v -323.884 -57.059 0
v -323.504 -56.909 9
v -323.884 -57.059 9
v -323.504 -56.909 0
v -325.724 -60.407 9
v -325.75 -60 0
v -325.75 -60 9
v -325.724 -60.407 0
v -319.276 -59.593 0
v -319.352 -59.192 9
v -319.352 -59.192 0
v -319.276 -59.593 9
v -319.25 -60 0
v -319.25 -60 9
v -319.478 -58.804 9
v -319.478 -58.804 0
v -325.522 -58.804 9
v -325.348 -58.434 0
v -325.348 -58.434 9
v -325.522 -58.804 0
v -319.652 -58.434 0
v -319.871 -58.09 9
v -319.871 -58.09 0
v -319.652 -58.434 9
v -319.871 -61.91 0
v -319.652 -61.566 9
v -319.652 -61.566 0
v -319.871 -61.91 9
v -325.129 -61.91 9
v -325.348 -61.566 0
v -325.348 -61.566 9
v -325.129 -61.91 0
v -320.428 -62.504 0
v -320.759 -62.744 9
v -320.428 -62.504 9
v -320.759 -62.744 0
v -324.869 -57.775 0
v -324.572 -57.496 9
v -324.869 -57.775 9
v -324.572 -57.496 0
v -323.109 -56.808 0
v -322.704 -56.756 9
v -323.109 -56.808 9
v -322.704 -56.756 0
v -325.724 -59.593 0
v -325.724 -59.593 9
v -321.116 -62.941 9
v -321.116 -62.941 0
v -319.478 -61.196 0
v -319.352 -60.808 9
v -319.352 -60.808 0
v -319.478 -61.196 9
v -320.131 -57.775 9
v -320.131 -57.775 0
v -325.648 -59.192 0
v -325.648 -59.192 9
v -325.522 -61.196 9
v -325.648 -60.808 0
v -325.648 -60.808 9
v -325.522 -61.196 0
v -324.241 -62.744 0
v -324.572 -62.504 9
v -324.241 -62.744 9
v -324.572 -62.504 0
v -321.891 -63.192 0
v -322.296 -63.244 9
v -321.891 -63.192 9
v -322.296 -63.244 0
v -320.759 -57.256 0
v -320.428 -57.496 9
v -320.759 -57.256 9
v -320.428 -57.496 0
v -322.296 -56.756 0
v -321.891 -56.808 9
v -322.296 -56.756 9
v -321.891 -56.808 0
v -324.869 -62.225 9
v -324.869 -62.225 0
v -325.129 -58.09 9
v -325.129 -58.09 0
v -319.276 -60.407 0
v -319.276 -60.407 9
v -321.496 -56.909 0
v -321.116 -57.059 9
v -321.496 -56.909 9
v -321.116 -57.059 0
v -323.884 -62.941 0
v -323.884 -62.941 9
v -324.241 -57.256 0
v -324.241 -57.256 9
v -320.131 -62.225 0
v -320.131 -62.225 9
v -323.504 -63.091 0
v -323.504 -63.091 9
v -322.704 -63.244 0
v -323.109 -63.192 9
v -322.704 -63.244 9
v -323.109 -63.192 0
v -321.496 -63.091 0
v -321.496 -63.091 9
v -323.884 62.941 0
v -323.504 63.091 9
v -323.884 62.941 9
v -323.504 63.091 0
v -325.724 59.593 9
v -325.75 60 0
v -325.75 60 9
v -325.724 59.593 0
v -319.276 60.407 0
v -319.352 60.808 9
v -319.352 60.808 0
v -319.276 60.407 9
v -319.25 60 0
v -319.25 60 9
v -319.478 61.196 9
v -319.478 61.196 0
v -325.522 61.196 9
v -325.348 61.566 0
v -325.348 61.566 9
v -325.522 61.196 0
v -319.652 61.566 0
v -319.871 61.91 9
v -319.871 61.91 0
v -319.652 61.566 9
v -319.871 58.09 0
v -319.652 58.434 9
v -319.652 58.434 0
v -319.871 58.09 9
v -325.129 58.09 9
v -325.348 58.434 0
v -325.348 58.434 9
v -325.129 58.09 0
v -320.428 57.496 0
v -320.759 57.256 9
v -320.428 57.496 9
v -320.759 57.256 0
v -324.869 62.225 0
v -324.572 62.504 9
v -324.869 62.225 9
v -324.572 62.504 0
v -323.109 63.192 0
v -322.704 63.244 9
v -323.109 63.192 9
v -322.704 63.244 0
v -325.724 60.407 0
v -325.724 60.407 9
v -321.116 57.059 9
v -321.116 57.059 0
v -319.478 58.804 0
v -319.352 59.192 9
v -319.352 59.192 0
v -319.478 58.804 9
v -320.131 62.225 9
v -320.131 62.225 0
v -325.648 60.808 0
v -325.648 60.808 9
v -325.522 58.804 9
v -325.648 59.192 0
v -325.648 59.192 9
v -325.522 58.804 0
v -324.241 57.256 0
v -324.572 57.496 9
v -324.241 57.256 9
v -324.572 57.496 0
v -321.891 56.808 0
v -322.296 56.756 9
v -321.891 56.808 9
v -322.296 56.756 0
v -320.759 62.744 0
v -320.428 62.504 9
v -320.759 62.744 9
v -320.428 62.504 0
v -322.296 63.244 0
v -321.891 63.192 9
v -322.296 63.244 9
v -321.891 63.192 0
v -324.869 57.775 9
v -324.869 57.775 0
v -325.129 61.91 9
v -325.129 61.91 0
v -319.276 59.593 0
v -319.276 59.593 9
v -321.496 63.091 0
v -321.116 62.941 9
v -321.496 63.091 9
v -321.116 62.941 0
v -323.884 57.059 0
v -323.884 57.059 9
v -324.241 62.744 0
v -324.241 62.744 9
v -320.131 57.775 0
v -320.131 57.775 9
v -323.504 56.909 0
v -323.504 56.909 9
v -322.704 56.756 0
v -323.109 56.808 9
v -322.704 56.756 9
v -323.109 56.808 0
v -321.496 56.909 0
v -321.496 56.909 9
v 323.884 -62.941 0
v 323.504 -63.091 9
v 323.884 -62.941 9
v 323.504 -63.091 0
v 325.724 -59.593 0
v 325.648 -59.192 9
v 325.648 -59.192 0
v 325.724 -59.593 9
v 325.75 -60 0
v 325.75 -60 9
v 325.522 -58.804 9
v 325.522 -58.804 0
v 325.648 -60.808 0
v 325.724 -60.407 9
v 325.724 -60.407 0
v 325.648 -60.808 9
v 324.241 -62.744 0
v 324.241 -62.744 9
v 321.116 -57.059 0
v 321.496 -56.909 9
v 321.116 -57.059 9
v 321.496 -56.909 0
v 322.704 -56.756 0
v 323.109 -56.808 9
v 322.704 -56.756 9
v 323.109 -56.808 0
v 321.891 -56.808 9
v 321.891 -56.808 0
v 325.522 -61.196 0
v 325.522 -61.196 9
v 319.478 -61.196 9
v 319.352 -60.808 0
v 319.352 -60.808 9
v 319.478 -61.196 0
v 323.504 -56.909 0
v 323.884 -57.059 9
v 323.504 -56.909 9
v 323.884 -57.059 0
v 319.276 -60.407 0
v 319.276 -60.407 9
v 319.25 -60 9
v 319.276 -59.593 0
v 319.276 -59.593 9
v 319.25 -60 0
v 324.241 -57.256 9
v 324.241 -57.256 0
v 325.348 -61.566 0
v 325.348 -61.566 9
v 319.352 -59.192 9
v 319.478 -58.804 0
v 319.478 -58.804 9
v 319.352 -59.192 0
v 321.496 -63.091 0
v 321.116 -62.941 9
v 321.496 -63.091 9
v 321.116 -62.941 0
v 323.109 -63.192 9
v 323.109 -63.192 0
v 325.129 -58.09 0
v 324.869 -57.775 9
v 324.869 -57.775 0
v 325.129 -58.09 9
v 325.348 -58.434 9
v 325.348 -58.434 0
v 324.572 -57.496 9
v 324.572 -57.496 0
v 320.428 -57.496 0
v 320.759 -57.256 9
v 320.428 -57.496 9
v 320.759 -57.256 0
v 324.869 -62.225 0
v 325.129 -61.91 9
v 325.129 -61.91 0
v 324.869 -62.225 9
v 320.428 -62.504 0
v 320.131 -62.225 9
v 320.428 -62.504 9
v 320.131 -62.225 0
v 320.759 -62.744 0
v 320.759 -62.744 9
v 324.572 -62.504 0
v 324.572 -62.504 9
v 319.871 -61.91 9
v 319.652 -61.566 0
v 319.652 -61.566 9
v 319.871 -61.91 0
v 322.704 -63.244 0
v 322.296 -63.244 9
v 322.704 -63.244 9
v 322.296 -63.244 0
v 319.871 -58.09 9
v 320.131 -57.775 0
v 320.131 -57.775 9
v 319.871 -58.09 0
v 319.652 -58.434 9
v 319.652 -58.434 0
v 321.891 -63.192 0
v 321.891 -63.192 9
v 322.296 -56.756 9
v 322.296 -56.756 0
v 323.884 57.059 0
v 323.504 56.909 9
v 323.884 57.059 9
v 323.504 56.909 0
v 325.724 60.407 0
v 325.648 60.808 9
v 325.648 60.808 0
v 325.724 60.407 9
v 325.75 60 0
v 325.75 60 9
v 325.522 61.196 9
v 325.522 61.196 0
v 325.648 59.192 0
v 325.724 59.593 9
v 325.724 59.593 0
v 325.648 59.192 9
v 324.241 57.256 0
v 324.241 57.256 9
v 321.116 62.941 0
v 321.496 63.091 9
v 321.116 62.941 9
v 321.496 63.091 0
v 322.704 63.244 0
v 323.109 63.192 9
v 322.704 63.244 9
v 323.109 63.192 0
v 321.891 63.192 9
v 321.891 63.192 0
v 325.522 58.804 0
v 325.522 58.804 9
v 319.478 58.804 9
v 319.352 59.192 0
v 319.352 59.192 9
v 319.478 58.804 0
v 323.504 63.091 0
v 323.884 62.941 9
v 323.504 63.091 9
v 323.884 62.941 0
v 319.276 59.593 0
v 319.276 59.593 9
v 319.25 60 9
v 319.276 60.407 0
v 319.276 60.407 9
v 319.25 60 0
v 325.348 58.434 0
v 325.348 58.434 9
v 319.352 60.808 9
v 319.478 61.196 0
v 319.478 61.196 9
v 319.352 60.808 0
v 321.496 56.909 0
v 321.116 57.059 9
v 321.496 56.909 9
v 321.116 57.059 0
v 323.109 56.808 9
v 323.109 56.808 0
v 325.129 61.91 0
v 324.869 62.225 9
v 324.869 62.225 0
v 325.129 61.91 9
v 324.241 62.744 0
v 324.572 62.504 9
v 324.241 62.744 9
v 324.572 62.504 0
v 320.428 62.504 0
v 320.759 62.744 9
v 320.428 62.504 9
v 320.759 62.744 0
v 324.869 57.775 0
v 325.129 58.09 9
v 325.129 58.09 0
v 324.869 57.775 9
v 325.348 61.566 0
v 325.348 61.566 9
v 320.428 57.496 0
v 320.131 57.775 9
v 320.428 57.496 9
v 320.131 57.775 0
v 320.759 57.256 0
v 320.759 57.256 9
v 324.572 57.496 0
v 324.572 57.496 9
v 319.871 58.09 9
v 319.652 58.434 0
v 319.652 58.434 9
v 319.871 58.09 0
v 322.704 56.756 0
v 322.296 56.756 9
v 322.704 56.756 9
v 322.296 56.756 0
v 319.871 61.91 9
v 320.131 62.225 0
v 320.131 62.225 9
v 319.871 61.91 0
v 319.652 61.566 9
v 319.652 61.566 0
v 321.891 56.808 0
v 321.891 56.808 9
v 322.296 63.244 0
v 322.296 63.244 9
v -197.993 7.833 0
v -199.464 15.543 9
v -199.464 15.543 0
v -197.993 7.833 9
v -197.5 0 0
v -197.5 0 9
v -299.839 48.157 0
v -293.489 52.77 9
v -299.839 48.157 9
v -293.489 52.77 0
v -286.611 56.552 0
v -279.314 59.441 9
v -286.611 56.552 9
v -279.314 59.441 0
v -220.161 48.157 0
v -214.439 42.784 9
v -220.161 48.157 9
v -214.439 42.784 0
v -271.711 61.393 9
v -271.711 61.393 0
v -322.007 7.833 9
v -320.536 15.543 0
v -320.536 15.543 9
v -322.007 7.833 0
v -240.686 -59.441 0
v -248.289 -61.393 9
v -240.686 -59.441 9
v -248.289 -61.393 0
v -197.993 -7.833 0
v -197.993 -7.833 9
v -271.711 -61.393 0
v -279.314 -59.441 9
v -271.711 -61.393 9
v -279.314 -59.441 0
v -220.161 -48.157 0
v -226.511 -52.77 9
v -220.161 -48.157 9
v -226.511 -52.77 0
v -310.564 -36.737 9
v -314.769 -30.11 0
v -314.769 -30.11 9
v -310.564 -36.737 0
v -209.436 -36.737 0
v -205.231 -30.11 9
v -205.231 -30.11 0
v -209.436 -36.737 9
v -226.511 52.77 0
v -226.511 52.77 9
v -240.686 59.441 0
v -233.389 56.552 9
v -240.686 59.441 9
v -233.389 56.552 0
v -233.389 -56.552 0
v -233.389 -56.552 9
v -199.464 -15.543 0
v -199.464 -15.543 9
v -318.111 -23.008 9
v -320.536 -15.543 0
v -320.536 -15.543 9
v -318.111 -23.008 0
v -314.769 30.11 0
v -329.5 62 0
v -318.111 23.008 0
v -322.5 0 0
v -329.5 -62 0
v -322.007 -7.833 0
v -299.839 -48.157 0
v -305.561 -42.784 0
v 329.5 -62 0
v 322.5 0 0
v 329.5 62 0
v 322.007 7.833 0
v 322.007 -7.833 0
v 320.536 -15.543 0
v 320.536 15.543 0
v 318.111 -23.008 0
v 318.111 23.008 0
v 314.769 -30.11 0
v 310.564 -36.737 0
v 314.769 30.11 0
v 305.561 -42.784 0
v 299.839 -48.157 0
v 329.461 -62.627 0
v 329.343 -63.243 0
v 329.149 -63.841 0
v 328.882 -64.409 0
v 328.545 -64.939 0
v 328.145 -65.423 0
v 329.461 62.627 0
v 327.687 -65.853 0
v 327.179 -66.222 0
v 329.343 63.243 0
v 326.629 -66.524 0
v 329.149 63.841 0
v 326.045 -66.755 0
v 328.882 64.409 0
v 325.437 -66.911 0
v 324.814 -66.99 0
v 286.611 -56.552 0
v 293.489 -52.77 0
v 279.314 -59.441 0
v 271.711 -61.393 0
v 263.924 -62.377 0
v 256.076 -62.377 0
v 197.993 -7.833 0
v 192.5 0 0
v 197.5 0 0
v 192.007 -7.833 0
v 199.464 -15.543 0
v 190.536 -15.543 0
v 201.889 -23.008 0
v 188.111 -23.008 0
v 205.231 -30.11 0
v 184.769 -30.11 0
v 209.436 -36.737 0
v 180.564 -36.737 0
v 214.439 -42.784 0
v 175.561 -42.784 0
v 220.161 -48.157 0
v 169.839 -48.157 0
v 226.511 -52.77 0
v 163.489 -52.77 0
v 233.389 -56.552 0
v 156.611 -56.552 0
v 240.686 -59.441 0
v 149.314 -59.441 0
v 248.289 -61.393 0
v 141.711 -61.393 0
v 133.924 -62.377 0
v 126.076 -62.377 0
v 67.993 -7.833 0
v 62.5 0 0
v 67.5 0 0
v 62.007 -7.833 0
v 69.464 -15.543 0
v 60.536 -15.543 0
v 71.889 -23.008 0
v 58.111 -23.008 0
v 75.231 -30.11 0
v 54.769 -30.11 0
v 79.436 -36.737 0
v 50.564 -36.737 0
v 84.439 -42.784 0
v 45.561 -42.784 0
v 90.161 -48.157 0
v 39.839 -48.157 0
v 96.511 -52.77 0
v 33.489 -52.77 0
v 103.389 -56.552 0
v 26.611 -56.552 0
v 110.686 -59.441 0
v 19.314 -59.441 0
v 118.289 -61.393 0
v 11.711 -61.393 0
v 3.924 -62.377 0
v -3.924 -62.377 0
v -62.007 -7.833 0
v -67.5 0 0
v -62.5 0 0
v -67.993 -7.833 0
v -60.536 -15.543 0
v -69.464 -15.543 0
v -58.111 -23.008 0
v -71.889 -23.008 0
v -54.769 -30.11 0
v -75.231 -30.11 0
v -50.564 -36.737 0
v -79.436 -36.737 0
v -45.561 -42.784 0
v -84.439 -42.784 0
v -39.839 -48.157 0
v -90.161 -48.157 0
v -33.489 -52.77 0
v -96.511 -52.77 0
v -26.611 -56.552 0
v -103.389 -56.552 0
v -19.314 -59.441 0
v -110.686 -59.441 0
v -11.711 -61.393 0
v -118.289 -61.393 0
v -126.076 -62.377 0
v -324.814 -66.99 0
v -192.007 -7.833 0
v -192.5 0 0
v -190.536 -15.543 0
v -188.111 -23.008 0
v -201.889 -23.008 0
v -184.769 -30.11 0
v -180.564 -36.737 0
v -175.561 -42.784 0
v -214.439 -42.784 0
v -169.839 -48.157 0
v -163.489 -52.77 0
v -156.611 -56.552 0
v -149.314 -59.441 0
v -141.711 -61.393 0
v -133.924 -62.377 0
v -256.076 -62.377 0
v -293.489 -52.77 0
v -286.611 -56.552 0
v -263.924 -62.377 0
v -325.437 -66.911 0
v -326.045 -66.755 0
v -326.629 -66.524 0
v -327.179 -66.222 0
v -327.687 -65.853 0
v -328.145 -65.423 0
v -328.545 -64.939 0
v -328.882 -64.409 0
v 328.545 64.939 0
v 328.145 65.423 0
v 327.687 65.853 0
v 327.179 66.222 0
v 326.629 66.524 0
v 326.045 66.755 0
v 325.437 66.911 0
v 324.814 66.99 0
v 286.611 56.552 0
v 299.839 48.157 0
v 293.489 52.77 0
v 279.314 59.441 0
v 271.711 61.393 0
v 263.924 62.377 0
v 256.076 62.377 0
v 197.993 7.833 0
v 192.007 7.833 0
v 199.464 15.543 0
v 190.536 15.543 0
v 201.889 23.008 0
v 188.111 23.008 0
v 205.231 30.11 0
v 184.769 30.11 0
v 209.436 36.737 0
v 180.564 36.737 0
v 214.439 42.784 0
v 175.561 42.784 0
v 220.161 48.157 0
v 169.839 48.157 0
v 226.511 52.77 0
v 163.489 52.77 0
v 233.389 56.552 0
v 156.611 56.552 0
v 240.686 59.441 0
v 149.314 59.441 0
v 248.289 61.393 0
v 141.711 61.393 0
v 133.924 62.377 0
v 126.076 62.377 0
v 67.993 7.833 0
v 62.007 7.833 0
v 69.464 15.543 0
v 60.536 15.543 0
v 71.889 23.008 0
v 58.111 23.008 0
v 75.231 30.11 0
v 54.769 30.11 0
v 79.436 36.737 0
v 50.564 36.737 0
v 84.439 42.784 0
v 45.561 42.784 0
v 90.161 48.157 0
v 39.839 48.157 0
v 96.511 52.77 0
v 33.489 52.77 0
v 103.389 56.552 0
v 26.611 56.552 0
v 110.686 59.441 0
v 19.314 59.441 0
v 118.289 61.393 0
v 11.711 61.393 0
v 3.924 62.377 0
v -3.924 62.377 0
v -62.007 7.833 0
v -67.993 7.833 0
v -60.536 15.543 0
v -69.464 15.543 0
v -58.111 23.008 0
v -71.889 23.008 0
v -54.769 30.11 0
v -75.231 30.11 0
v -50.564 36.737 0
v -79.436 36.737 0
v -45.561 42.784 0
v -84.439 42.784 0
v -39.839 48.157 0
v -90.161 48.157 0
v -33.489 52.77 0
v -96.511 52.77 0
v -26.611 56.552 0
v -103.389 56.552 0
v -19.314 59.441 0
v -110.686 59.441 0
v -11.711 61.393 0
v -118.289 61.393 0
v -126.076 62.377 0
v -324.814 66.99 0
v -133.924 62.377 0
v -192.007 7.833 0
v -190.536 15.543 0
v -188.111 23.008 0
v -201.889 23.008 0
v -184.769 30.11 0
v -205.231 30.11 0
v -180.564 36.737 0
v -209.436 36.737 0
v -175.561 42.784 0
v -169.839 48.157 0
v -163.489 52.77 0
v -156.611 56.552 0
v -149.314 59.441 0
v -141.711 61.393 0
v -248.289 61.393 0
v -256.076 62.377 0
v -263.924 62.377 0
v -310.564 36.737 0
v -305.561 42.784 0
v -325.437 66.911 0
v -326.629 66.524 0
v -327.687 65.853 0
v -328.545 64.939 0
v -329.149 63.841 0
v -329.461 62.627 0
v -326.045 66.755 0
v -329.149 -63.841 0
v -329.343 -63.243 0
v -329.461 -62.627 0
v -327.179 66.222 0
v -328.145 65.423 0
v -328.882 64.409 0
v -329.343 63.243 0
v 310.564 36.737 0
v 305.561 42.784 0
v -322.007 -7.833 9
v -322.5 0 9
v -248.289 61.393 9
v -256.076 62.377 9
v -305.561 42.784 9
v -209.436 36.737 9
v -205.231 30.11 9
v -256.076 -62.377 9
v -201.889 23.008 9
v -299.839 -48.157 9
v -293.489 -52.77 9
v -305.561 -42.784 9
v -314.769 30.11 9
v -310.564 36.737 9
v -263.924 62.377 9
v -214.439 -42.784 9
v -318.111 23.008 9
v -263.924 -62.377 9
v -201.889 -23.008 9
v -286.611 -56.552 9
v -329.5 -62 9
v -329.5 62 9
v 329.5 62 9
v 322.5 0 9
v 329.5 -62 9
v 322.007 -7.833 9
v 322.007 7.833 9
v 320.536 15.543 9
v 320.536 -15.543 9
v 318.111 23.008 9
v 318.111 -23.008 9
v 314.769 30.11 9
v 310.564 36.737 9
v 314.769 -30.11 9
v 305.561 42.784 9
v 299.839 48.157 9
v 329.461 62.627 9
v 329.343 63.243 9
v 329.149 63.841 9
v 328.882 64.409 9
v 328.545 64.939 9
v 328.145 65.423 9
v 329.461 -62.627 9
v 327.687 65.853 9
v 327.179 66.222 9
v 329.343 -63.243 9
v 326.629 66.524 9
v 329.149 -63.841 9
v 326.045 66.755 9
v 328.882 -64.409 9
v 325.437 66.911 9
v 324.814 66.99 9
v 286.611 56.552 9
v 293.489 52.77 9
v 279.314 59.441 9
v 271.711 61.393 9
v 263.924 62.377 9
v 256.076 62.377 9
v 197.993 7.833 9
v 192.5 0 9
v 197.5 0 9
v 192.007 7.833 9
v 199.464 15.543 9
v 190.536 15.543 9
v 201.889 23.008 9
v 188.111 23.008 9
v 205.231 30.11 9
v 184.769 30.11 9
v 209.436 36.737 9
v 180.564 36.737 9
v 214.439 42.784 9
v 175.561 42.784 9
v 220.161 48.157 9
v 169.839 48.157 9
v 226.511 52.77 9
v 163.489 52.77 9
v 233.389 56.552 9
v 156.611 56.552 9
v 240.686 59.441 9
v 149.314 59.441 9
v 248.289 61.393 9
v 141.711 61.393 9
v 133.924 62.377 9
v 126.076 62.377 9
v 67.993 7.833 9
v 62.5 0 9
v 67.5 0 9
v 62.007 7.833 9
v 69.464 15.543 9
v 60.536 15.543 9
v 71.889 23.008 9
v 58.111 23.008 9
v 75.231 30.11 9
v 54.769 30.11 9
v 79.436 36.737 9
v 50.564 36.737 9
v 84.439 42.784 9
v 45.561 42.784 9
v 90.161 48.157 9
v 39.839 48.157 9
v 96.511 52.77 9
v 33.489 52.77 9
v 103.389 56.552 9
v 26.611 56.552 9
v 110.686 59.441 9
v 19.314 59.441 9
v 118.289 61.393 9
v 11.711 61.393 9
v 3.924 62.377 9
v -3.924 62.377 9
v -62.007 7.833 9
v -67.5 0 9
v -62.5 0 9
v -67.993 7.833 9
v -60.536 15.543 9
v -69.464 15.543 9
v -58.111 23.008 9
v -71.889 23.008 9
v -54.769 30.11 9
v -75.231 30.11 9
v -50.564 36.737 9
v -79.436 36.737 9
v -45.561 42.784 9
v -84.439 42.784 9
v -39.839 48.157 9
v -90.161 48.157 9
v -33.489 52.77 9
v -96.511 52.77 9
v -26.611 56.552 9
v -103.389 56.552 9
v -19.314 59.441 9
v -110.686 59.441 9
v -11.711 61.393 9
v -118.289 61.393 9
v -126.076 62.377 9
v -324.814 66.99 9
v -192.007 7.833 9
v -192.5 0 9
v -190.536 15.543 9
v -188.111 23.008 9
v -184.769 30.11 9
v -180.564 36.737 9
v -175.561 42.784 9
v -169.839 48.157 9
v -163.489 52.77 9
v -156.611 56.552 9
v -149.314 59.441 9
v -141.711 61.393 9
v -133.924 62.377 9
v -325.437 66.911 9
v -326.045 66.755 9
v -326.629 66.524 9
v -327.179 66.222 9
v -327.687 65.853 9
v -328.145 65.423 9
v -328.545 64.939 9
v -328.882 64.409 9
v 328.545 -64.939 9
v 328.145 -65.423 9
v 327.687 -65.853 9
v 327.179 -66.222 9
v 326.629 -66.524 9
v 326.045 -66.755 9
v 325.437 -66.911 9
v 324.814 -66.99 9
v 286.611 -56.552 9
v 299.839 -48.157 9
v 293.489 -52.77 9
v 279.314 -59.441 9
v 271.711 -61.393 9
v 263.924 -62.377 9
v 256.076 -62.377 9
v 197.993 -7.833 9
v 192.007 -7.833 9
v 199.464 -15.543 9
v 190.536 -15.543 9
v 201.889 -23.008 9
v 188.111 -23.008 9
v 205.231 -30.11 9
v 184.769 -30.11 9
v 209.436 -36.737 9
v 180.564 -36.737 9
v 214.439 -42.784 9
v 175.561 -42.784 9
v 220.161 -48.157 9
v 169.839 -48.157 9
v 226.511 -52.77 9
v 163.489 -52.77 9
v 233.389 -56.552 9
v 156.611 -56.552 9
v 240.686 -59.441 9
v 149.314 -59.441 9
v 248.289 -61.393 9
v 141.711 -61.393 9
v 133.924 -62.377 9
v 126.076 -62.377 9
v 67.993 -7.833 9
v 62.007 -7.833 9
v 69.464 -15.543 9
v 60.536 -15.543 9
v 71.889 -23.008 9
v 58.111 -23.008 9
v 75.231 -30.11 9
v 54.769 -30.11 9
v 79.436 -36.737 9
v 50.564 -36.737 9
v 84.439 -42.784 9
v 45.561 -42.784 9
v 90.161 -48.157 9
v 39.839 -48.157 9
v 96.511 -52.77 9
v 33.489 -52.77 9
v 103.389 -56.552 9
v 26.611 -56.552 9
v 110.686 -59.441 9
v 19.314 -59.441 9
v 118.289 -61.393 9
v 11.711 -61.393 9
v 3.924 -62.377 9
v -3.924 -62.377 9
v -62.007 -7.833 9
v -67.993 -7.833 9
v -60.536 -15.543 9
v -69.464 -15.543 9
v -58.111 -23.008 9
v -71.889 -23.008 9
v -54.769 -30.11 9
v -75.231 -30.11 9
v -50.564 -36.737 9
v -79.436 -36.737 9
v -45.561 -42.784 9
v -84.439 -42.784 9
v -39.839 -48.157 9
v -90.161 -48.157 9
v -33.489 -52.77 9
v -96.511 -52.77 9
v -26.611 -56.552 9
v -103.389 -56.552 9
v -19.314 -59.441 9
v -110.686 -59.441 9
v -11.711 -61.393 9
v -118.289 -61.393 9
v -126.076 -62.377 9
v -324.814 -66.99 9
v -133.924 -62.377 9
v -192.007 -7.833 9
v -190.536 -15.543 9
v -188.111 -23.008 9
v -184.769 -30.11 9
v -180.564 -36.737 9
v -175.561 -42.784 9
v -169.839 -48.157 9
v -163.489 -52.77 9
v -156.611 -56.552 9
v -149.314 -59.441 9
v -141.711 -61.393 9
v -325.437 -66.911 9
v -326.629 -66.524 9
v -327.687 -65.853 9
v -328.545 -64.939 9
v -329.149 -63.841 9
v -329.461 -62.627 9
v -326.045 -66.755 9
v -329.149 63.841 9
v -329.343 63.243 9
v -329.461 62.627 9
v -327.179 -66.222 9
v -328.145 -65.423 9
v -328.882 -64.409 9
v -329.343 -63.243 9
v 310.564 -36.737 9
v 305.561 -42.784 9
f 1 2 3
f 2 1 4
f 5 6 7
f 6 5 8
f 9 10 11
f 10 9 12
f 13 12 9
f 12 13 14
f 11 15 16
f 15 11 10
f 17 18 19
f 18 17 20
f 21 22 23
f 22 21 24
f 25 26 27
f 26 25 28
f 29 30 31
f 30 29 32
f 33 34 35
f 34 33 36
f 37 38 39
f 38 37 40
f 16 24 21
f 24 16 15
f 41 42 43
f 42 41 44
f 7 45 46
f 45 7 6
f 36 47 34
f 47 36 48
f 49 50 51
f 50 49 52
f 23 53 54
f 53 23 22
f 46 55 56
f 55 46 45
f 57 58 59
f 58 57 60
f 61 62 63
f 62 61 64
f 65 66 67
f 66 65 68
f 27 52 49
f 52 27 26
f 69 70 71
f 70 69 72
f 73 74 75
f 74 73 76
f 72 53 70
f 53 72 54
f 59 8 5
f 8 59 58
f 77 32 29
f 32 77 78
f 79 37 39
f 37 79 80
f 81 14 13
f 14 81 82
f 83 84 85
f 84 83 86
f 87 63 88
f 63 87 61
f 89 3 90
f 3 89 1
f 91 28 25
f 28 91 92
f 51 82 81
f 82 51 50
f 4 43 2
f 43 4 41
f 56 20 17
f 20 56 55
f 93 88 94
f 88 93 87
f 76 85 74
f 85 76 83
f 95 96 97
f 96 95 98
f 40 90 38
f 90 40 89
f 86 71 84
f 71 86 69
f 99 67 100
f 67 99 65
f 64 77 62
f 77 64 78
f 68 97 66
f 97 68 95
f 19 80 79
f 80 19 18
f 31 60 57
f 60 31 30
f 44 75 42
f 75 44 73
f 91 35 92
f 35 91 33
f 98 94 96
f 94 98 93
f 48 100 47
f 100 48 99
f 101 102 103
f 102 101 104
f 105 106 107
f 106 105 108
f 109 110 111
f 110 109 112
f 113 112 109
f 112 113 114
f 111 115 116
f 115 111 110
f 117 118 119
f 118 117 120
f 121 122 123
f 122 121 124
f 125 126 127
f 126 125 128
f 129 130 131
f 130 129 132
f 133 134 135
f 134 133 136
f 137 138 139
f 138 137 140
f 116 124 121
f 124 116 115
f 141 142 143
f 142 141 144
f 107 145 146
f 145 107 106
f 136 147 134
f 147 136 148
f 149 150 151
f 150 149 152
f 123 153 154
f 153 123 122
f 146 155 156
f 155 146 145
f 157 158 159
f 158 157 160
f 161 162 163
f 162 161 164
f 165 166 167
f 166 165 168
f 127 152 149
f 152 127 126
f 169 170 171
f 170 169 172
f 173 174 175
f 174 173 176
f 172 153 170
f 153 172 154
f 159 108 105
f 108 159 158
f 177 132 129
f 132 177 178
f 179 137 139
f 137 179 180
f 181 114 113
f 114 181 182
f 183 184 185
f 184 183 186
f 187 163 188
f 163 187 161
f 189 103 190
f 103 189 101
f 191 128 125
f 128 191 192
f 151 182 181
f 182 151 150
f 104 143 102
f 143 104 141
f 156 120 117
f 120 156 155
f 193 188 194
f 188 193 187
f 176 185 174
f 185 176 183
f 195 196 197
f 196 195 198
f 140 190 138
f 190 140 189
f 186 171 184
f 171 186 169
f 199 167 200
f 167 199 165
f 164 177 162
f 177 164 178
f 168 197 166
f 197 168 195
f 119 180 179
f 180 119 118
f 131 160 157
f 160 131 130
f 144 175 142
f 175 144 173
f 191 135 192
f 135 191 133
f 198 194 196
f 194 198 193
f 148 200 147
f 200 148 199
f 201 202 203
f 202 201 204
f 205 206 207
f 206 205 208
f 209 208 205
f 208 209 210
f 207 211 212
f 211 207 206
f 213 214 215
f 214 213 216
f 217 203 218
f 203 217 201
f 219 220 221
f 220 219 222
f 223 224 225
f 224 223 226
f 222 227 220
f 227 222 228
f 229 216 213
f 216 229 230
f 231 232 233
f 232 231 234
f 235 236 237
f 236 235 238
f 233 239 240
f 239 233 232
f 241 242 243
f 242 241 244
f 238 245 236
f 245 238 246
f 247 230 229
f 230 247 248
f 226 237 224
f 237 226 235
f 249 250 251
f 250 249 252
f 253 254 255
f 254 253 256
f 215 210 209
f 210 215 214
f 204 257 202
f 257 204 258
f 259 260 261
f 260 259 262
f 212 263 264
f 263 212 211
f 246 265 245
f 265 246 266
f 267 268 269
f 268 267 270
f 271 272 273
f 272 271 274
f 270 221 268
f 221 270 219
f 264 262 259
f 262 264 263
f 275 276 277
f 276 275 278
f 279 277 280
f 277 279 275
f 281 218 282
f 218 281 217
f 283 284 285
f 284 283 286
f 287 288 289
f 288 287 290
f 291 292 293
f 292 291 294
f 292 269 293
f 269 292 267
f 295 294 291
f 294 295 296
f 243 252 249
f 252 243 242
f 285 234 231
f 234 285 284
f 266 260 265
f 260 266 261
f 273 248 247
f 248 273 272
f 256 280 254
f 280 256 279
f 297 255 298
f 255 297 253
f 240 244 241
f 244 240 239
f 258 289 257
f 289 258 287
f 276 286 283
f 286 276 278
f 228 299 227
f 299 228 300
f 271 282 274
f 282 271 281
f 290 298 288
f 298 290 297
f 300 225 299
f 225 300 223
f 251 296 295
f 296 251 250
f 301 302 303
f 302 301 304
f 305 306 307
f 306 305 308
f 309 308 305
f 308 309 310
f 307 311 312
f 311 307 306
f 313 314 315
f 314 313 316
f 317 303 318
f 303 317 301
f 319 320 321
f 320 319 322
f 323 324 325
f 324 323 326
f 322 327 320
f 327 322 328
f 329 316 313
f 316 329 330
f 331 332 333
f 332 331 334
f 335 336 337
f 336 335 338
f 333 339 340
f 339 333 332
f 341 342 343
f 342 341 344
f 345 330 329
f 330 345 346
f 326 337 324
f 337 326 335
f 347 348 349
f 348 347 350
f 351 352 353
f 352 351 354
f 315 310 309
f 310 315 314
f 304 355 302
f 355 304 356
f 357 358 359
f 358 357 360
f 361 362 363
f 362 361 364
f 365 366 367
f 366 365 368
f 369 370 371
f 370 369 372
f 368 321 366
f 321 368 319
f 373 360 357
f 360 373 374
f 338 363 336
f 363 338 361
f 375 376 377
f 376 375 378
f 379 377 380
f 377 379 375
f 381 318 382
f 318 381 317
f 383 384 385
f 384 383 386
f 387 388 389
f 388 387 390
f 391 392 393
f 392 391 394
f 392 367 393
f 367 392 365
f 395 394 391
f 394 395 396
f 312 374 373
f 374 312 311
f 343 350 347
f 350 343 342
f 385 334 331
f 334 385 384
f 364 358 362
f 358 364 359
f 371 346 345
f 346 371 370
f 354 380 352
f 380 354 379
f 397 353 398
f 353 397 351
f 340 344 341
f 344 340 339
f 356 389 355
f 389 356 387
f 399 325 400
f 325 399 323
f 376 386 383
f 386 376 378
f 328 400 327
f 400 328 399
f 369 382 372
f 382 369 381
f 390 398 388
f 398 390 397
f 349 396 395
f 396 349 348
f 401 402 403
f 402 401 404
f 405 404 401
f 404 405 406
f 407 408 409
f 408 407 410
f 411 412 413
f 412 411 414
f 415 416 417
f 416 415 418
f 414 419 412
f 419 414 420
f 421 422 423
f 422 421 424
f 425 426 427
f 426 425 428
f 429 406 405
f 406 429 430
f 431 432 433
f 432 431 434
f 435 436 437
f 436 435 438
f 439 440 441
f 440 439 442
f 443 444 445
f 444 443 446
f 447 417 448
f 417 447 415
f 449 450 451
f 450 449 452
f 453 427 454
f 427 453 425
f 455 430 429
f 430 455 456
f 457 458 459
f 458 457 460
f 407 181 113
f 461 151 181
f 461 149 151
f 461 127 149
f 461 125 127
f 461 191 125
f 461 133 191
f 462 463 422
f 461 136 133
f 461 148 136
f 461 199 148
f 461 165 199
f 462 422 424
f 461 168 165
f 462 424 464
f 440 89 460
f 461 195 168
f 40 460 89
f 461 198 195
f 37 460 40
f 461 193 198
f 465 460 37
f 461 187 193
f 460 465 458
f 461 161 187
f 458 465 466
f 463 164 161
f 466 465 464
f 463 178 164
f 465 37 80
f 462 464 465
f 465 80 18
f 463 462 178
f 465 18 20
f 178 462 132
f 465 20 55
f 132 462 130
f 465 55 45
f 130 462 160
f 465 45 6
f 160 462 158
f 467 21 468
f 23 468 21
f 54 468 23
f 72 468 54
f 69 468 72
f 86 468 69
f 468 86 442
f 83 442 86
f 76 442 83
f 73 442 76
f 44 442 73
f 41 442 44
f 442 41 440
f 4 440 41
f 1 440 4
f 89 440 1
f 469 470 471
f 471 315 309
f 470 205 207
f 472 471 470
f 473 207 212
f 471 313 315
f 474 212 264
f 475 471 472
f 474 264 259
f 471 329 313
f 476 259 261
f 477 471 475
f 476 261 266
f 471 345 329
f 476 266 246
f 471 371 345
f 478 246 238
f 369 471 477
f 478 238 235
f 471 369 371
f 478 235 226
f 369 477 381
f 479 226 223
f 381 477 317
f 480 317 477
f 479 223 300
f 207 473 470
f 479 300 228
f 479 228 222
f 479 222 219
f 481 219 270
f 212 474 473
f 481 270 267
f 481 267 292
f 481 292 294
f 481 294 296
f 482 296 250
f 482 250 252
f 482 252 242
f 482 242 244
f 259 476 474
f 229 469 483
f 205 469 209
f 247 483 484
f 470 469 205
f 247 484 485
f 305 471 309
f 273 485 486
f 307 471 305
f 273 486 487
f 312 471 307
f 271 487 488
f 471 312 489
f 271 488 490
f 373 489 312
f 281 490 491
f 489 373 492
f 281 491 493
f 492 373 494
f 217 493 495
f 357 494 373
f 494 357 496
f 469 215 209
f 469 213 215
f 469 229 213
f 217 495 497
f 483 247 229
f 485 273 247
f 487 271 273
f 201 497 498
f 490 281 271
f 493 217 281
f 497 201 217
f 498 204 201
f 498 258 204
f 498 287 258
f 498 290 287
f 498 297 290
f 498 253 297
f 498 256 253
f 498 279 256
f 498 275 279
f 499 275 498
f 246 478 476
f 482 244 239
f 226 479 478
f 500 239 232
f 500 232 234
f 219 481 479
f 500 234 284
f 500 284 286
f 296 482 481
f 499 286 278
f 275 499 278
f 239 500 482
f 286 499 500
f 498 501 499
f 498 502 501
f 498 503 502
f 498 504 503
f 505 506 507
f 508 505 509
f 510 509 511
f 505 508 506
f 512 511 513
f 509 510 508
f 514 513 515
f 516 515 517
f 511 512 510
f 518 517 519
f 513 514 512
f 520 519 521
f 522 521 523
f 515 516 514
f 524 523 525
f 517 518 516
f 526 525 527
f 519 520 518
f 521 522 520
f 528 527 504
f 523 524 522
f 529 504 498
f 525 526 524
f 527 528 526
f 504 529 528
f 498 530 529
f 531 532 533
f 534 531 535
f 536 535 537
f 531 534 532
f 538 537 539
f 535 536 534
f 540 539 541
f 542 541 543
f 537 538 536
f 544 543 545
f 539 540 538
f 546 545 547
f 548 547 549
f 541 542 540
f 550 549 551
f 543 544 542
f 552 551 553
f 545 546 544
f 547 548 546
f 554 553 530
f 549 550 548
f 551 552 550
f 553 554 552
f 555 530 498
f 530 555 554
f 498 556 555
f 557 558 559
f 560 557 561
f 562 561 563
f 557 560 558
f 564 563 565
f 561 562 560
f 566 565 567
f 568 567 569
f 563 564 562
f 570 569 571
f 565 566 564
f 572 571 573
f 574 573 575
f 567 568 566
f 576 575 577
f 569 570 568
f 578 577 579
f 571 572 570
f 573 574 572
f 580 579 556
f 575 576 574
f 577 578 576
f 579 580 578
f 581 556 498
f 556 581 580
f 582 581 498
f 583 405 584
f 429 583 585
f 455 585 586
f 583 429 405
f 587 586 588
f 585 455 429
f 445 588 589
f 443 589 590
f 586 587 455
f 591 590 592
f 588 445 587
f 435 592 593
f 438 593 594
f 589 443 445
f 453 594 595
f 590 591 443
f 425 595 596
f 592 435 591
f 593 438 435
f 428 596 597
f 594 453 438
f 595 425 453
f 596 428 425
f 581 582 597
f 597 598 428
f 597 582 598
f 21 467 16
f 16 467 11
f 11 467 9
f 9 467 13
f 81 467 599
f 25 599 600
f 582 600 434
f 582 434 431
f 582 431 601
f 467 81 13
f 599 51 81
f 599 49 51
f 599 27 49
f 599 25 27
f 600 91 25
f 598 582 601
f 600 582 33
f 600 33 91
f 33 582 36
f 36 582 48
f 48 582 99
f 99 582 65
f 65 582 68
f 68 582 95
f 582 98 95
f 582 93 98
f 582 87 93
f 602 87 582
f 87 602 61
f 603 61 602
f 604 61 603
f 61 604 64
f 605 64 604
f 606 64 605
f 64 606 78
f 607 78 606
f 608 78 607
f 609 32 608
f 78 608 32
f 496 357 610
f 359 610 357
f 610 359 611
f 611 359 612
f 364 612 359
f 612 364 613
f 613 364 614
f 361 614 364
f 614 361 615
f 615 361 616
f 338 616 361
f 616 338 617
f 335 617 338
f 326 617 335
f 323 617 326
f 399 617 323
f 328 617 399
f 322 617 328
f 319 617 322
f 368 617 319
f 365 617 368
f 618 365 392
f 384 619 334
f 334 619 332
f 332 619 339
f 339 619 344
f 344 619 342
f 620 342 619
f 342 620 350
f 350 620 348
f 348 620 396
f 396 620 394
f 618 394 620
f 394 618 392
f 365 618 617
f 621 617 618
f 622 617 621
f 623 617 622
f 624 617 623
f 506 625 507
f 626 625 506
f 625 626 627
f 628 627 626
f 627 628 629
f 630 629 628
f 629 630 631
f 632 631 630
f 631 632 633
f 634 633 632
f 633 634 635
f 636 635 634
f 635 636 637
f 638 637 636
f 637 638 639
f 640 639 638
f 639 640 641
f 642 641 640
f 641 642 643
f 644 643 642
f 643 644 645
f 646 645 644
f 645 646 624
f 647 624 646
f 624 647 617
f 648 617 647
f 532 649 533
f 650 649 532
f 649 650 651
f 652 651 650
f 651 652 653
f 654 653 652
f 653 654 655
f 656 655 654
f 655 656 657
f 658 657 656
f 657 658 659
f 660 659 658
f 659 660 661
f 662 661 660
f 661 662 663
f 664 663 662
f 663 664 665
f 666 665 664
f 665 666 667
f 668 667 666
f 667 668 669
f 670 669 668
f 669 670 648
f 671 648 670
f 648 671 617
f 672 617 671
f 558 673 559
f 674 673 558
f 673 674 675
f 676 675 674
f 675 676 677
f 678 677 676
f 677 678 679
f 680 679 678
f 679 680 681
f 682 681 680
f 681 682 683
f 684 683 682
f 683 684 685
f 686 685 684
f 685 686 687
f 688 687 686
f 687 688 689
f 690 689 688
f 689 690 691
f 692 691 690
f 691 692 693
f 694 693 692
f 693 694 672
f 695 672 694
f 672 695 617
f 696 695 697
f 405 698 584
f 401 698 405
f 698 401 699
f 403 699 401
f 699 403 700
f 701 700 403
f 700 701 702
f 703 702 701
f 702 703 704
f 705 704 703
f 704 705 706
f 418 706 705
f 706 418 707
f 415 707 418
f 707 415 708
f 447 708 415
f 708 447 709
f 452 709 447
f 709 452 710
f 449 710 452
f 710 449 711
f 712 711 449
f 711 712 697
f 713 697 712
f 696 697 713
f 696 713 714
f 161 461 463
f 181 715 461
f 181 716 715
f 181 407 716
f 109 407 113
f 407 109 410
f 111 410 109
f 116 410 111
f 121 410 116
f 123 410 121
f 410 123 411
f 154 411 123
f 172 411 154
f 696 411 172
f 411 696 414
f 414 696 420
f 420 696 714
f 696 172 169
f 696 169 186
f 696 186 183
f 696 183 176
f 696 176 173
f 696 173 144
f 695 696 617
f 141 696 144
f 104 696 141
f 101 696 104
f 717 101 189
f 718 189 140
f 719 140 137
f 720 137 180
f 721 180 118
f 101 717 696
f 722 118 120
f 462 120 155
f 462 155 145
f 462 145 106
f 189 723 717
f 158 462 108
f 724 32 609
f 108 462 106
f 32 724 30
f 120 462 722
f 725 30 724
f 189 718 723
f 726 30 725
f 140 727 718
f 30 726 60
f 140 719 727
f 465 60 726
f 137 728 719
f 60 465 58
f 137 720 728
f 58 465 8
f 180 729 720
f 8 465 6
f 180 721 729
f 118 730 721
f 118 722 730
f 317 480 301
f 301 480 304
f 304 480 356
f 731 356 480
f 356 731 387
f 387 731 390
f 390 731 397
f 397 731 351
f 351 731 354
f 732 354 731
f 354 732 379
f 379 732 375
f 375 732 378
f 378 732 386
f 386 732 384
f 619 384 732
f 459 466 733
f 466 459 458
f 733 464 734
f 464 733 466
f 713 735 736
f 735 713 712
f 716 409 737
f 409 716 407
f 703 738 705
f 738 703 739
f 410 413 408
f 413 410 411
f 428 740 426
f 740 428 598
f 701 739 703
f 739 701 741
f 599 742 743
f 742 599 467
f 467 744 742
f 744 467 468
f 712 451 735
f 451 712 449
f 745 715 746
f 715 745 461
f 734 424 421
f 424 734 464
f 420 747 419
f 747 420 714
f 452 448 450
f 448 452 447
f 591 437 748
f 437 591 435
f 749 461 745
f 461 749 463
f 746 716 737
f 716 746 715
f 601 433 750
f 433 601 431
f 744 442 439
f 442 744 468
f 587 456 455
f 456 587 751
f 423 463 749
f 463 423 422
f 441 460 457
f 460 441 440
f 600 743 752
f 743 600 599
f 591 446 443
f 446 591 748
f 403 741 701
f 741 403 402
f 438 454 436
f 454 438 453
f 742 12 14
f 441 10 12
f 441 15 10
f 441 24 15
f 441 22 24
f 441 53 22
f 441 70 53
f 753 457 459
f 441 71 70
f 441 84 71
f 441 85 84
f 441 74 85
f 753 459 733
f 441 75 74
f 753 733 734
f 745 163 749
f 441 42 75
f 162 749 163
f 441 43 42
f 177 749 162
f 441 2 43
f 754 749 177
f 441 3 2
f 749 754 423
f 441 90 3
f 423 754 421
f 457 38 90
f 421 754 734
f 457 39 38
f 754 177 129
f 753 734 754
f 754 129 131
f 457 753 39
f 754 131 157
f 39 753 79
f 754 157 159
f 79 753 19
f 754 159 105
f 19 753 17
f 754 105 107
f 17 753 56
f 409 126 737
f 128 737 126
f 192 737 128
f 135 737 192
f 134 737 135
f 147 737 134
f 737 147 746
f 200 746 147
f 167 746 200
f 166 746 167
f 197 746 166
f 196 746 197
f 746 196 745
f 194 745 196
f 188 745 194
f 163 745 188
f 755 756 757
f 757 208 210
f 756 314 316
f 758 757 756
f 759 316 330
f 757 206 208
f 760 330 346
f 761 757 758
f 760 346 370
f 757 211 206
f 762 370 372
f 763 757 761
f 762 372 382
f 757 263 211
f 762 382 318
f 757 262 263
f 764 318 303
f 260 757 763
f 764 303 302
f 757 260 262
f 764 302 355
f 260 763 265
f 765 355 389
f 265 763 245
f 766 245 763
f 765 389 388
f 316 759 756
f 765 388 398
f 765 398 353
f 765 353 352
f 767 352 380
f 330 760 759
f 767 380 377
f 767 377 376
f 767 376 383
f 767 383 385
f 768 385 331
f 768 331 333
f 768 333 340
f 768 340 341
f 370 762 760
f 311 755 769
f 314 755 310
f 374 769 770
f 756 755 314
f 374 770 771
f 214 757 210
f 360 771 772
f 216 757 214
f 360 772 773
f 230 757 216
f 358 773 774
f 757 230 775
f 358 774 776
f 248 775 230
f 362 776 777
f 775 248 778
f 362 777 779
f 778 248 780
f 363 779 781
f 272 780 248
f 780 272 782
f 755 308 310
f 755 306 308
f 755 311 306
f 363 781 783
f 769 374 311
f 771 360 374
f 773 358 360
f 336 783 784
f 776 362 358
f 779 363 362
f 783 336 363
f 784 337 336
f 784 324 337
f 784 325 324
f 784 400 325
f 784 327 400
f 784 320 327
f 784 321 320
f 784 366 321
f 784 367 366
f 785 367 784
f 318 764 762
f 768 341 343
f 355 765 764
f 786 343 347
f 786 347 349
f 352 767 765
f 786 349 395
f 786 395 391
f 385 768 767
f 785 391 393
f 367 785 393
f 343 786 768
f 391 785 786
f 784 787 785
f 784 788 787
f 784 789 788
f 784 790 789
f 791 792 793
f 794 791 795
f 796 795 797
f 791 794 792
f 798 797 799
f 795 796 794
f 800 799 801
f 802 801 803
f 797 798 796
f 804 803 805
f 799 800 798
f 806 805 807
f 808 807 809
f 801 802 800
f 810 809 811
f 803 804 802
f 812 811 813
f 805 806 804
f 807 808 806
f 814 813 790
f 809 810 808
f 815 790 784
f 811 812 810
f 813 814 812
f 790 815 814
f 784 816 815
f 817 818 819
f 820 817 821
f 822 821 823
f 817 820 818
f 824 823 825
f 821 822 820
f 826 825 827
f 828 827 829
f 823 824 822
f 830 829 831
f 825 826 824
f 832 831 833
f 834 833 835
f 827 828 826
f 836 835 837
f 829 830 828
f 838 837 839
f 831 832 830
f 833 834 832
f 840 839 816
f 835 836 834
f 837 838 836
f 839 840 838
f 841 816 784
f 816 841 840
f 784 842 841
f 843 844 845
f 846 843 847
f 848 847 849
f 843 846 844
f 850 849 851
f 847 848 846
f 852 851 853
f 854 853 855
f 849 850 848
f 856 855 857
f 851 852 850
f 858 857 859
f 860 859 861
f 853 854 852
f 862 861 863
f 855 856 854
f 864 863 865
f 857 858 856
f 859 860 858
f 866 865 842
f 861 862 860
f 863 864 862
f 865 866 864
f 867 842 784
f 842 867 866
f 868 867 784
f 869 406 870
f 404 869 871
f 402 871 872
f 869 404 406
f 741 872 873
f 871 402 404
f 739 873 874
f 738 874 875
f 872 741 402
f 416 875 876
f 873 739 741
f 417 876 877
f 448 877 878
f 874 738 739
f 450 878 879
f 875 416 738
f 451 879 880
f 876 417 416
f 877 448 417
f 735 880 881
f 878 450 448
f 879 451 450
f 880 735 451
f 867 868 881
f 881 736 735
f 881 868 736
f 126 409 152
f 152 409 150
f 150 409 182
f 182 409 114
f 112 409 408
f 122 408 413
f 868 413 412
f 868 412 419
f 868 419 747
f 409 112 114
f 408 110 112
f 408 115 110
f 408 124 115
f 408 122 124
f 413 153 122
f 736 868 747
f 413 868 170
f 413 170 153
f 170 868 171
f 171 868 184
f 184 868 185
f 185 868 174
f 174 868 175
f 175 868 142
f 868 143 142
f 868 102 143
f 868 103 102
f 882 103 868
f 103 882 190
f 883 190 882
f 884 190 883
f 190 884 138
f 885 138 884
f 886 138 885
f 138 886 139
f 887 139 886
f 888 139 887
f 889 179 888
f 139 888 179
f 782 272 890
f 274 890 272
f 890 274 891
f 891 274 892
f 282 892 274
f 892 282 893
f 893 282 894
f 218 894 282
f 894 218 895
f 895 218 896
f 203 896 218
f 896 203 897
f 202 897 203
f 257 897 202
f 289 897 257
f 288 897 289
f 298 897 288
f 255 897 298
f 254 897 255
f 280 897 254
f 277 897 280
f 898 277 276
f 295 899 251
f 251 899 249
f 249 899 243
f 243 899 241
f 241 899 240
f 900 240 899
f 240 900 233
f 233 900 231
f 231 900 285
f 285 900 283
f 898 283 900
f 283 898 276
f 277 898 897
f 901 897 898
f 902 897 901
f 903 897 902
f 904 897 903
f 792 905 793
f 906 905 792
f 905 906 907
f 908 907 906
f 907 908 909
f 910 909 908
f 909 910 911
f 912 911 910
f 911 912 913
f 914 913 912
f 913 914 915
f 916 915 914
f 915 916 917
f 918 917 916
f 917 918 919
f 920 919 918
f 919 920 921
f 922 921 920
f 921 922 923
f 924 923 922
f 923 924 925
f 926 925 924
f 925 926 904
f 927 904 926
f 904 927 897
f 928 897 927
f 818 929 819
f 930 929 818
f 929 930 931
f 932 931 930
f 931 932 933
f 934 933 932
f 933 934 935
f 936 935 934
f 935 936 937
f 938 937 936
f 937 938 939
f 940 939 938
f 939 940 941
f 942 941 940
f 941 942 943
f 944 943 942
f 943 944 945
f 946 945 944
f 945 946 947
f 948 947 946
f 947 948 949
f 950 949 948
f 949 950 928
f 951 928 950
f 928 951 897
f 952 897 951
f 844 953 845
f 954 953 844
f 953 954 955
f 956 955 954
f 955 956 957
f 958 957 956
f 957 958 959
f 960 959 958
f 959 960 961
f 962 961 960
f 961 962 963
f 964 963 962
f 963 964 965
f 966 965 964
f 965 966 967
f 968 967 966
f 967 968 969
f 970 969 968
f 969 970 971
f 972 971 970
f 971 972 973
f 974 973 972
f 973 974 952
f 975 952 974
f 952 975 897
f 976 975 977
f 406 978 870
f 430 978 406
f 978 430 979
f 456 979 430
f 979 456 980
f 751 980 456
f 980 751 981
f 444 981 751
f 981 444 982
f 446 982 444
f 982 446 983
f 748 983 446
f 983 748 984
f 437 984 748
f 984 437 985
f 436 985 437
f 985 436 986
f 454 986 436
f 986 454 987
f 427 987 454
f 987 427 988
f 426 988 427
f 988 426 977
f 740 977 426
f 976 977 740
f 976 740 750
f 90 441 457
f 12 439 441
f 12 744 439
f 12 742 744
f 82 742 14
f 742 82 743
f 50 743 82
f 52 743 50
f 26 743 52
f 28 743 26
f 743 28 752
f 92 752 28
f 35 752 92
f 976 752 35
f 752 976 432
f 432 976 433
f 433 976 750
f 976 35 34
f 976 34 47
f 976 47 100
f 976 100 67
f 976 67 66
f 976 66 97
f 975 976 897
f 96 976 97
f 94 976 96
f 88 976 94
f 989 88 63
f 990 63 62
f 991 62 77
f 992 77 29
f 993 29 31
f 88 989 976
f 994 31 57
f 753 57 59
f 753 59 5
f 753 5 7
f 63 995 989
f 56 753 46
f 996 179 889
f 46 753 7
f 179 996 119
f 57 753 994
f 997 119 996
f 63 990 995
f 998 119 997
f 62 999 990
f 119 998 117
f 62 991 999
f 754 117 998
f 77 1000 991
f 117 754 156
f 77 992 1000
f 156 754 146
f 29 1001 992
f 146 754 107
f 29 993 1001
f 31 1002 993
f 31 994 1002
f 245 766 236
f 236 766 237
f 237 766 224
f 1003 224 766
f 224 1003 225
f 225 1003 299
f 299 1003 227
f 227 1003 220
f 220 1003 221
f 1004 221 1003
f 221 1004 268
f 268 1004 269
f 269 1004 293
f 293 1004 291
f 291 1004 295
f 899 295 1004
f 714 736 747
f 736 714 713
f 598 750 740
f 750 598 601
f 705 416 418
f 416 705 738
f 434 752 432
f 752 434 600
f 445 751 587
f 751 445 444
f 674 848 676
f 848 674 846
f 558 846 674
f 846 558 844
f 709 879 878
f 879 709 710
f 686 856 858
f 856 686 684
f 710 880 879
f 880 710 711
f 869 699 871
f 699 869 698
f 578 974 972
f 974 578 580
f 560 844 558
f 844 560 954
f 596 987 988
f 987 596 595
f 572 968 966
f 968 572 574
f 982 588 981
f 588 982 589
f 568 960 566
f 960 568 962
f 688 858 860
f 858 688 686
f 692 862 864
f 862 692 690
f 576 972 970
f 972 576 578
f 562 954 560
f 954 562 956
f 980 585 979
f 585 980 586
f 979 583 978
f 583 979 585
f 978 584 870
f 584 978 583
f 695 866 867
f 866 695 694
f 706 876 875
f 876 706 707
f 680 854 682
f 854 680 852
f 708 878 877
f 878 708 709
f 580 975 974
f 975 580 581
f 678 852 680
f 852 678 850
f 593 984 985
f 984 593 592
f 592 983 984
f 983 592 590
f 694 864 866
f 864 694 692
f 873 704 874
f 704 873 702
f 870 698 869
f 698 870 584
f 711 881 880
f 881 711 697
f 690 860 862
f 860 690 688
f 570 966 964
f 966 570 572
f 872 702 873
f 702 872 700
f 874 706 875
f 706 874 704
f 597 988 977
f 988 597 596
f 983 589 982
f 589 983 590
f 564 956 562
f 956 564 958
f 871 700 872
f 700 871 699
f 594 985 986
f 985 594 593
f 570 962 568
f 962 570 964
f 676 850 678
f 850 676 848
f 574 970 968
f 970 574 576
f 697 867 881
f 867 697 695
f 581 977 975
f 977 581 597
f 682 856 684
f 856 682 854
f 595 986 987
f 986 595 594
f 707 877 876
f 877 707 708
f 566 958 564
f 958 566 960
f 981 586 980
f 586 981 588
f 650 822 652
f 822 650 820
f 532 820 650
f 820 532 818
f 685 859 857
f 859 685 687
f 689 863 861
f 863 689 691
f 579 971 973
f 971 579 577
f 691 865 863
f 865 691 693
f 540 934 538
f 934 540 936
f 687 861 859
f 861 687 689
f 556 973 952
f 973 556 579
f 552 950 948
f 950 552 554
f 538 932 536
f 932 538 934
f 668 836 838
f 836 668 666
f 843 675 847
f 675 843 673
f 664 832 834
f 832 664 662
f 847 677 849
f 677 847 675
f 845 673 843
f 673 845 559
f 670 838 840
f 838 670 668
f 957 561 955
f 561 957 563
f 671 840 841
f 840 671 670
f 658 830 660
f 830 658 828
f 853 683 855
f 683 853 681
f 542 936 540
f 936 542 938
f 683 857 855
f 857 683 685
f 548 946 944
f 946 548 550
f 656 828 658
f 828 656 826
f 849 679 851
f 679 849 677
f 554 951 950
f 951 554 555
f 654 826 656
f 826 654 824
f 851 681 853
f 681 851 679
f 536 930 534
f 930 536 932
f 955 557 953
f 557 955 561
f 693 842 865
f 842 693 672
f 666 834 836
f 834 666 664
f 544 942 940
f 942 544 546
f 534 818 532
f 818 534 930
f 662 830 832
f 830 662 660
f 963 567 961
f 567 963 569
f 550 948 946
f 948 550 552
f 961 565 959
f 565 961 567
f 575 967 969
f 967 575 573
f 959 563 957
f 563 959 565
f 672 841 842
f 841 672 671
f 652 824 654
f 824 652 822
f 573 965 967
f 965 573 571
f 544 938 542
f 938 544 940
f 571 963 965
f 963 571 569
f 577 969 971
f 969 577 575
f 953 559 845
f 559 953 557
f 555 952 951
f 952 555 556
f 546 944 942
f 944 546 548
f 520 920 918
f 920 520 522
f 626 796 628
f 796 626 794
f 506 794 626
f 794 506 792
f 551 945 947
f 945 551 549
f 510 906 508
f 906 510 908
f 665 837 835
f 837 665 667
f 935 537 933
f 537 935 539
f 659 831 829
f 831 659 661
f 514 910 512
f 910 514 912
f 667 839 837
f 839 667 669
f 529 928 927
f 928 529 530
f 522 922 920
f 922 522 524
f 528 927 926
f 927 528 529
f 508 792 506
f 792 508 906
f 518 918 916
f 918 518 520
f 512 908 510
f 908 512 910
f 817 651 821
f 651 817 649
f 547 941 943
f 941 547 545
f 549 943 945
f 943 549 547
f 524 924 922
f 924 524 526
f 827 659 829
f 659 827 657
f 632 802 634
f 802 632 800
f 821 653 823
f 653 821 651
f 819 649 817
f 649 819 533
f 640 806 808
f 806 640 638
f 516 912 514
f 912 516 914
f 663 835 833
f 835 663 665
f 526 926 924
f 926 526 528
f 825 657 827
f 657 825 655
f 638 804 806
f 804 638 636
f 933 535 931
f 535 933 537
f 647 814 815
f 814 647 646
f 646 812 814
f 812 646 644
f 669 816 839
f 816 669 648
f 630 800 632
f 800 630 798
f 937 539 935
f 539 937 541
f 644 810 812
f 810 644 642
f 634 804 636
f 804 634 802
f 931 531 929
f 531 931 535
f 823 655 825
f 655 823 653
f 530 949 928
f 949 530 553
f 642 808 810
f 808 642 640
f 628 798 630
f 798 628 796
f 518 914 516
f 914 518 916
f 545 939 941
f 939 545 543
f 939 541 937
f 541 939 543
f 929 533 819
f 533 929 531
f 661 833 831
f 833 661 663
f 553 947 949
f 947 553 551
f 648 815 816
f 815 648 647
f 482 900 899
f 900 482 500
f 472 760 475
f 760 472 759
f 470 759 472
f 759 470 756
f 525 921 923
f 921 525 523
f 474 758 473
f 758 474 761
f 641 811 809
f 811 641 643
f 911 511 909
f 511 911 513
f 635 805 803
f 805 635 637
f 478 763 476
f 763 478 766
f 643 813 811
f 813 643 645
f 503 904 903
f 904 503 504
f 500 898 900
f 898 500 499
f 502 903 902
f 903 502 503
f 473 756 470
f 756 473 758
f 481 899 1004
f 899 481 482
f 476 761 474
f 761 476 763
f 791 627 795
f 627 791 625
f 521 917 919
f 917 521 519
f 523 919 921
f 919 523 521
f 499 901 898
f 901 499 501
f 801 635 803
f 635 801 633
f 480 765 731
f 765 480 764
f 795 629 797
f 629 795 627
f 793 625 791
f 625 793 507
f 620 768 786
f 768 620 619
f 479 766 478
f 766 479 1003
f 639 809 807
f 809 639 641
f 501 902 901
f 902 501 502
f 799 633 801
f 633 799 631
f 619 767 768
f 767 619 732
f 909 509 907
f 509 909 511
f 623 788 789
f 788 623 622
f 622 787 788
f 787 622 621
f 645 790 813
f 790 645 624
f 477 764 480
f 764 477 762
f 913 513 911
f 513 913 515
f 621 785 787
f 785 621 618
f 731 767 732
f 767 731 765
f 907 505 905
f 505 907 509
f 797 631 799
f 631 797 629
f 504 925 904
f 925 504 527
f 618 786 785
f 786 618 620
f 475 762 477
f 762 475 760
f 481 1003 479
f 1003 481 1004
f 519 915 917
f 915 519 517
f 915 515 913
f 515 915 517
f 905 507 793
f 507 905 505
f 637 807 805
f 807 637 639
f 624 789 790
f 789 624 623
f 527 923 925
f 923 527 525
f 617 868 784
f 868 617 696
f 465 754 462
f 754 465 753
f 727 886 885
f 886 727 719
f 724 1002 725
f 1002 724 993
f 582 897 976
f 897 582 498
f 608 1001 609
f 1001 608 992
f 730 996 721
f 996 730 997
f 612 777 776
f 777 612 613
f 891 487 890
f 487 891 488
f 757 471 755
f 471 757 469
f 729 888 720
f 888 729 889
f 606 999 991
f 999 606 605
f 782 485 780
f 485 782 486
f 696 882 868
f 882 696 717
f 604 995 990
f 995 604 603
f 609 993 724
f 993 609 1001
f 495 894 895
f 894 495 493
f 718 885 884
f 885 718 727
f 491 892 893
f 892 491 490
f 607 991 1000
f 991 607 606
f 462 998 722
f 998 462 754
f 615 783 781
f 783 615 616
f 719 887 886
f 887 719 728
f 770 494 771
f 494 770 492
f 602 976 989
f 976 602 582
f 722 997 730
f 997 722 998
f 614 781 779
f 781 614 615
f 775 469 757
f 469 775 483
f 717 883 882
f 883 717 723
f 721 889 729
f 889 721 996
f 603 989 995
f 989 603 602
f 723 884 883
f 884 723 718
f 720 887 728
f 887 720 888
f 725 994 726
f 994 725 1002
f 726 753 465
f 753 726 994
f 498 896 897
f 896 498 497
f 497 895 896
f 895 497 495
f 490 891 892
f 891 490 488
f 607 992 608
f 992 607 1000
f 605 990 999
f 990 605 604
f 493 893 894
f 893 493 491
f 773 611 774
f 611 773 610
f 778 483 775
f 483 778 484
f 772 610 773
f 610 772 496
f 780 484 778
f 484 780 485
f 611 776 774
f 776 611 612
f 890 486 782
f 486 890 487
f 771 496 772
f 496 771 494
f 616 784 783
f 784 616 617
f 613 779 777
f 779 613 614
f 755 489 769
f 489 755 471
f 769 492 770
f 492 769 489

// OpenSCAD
$fn = 50;


difference() {
	union() {
		hull() {
			translate(v = [-324.5000000000, 62.0000000000, 0]) {
				cylinder(h = 9, r = 5);
			}
			translate(v = [324.5000000000, 62.0000000000, 0]) {
				cylinder(h = 9, r = 5);
			}
			translate(v = [-324.5000000000, -62.0000000000, 0]) {
				cylinder(h = 9, r = 5);
			}
			translate(v = [324.5000000000, -62.0000000000, 0]) {
				cylinder(h = 9, r = 5);
			}
		}
	}
	union() {
		#translate(v = [-322.5000000000, -60.0000000000, -100.0000000000]) {
			cylinder(h = 200, r = 3.2500000000);
		}
		#translate(v = [-322.5000000000, 60.0000000000, -100.0000000000]) {
			cylinder(h = 200, r = 3.2500000000);
		}
		#translate(v = [322.5000000000, -60.0000000000, -100.0000000000]) {
			cylinder(h = 200, r = 3.2500000000);
		}
		#translate(v = [322.5000000000, 60.0000000000, -100.0000000000]) {
			cylinder(h = 200, r = 3.2500000000);
		}
		#translate(v = [-260.0000000000, 0, 0]) {
			cylinder(h = 9, r = 62.5000000000);
		}
		#translate(v = [-130.0000000000, 0, 0]) {
			cylinder(h = 9, r = 62.5000000000);
		}
		#cylinder(h = 9, r = 62.5000000000);
		#translate(v = [130.0000000000, 0, 0]) {
			cylinder(h = 9, r = 62.5000000000);
		}
		#translate(v = [260.0000000000, 0, 0]) {
			cylinder(h = 9, r = 62.5000000000);
		}
	}
}
